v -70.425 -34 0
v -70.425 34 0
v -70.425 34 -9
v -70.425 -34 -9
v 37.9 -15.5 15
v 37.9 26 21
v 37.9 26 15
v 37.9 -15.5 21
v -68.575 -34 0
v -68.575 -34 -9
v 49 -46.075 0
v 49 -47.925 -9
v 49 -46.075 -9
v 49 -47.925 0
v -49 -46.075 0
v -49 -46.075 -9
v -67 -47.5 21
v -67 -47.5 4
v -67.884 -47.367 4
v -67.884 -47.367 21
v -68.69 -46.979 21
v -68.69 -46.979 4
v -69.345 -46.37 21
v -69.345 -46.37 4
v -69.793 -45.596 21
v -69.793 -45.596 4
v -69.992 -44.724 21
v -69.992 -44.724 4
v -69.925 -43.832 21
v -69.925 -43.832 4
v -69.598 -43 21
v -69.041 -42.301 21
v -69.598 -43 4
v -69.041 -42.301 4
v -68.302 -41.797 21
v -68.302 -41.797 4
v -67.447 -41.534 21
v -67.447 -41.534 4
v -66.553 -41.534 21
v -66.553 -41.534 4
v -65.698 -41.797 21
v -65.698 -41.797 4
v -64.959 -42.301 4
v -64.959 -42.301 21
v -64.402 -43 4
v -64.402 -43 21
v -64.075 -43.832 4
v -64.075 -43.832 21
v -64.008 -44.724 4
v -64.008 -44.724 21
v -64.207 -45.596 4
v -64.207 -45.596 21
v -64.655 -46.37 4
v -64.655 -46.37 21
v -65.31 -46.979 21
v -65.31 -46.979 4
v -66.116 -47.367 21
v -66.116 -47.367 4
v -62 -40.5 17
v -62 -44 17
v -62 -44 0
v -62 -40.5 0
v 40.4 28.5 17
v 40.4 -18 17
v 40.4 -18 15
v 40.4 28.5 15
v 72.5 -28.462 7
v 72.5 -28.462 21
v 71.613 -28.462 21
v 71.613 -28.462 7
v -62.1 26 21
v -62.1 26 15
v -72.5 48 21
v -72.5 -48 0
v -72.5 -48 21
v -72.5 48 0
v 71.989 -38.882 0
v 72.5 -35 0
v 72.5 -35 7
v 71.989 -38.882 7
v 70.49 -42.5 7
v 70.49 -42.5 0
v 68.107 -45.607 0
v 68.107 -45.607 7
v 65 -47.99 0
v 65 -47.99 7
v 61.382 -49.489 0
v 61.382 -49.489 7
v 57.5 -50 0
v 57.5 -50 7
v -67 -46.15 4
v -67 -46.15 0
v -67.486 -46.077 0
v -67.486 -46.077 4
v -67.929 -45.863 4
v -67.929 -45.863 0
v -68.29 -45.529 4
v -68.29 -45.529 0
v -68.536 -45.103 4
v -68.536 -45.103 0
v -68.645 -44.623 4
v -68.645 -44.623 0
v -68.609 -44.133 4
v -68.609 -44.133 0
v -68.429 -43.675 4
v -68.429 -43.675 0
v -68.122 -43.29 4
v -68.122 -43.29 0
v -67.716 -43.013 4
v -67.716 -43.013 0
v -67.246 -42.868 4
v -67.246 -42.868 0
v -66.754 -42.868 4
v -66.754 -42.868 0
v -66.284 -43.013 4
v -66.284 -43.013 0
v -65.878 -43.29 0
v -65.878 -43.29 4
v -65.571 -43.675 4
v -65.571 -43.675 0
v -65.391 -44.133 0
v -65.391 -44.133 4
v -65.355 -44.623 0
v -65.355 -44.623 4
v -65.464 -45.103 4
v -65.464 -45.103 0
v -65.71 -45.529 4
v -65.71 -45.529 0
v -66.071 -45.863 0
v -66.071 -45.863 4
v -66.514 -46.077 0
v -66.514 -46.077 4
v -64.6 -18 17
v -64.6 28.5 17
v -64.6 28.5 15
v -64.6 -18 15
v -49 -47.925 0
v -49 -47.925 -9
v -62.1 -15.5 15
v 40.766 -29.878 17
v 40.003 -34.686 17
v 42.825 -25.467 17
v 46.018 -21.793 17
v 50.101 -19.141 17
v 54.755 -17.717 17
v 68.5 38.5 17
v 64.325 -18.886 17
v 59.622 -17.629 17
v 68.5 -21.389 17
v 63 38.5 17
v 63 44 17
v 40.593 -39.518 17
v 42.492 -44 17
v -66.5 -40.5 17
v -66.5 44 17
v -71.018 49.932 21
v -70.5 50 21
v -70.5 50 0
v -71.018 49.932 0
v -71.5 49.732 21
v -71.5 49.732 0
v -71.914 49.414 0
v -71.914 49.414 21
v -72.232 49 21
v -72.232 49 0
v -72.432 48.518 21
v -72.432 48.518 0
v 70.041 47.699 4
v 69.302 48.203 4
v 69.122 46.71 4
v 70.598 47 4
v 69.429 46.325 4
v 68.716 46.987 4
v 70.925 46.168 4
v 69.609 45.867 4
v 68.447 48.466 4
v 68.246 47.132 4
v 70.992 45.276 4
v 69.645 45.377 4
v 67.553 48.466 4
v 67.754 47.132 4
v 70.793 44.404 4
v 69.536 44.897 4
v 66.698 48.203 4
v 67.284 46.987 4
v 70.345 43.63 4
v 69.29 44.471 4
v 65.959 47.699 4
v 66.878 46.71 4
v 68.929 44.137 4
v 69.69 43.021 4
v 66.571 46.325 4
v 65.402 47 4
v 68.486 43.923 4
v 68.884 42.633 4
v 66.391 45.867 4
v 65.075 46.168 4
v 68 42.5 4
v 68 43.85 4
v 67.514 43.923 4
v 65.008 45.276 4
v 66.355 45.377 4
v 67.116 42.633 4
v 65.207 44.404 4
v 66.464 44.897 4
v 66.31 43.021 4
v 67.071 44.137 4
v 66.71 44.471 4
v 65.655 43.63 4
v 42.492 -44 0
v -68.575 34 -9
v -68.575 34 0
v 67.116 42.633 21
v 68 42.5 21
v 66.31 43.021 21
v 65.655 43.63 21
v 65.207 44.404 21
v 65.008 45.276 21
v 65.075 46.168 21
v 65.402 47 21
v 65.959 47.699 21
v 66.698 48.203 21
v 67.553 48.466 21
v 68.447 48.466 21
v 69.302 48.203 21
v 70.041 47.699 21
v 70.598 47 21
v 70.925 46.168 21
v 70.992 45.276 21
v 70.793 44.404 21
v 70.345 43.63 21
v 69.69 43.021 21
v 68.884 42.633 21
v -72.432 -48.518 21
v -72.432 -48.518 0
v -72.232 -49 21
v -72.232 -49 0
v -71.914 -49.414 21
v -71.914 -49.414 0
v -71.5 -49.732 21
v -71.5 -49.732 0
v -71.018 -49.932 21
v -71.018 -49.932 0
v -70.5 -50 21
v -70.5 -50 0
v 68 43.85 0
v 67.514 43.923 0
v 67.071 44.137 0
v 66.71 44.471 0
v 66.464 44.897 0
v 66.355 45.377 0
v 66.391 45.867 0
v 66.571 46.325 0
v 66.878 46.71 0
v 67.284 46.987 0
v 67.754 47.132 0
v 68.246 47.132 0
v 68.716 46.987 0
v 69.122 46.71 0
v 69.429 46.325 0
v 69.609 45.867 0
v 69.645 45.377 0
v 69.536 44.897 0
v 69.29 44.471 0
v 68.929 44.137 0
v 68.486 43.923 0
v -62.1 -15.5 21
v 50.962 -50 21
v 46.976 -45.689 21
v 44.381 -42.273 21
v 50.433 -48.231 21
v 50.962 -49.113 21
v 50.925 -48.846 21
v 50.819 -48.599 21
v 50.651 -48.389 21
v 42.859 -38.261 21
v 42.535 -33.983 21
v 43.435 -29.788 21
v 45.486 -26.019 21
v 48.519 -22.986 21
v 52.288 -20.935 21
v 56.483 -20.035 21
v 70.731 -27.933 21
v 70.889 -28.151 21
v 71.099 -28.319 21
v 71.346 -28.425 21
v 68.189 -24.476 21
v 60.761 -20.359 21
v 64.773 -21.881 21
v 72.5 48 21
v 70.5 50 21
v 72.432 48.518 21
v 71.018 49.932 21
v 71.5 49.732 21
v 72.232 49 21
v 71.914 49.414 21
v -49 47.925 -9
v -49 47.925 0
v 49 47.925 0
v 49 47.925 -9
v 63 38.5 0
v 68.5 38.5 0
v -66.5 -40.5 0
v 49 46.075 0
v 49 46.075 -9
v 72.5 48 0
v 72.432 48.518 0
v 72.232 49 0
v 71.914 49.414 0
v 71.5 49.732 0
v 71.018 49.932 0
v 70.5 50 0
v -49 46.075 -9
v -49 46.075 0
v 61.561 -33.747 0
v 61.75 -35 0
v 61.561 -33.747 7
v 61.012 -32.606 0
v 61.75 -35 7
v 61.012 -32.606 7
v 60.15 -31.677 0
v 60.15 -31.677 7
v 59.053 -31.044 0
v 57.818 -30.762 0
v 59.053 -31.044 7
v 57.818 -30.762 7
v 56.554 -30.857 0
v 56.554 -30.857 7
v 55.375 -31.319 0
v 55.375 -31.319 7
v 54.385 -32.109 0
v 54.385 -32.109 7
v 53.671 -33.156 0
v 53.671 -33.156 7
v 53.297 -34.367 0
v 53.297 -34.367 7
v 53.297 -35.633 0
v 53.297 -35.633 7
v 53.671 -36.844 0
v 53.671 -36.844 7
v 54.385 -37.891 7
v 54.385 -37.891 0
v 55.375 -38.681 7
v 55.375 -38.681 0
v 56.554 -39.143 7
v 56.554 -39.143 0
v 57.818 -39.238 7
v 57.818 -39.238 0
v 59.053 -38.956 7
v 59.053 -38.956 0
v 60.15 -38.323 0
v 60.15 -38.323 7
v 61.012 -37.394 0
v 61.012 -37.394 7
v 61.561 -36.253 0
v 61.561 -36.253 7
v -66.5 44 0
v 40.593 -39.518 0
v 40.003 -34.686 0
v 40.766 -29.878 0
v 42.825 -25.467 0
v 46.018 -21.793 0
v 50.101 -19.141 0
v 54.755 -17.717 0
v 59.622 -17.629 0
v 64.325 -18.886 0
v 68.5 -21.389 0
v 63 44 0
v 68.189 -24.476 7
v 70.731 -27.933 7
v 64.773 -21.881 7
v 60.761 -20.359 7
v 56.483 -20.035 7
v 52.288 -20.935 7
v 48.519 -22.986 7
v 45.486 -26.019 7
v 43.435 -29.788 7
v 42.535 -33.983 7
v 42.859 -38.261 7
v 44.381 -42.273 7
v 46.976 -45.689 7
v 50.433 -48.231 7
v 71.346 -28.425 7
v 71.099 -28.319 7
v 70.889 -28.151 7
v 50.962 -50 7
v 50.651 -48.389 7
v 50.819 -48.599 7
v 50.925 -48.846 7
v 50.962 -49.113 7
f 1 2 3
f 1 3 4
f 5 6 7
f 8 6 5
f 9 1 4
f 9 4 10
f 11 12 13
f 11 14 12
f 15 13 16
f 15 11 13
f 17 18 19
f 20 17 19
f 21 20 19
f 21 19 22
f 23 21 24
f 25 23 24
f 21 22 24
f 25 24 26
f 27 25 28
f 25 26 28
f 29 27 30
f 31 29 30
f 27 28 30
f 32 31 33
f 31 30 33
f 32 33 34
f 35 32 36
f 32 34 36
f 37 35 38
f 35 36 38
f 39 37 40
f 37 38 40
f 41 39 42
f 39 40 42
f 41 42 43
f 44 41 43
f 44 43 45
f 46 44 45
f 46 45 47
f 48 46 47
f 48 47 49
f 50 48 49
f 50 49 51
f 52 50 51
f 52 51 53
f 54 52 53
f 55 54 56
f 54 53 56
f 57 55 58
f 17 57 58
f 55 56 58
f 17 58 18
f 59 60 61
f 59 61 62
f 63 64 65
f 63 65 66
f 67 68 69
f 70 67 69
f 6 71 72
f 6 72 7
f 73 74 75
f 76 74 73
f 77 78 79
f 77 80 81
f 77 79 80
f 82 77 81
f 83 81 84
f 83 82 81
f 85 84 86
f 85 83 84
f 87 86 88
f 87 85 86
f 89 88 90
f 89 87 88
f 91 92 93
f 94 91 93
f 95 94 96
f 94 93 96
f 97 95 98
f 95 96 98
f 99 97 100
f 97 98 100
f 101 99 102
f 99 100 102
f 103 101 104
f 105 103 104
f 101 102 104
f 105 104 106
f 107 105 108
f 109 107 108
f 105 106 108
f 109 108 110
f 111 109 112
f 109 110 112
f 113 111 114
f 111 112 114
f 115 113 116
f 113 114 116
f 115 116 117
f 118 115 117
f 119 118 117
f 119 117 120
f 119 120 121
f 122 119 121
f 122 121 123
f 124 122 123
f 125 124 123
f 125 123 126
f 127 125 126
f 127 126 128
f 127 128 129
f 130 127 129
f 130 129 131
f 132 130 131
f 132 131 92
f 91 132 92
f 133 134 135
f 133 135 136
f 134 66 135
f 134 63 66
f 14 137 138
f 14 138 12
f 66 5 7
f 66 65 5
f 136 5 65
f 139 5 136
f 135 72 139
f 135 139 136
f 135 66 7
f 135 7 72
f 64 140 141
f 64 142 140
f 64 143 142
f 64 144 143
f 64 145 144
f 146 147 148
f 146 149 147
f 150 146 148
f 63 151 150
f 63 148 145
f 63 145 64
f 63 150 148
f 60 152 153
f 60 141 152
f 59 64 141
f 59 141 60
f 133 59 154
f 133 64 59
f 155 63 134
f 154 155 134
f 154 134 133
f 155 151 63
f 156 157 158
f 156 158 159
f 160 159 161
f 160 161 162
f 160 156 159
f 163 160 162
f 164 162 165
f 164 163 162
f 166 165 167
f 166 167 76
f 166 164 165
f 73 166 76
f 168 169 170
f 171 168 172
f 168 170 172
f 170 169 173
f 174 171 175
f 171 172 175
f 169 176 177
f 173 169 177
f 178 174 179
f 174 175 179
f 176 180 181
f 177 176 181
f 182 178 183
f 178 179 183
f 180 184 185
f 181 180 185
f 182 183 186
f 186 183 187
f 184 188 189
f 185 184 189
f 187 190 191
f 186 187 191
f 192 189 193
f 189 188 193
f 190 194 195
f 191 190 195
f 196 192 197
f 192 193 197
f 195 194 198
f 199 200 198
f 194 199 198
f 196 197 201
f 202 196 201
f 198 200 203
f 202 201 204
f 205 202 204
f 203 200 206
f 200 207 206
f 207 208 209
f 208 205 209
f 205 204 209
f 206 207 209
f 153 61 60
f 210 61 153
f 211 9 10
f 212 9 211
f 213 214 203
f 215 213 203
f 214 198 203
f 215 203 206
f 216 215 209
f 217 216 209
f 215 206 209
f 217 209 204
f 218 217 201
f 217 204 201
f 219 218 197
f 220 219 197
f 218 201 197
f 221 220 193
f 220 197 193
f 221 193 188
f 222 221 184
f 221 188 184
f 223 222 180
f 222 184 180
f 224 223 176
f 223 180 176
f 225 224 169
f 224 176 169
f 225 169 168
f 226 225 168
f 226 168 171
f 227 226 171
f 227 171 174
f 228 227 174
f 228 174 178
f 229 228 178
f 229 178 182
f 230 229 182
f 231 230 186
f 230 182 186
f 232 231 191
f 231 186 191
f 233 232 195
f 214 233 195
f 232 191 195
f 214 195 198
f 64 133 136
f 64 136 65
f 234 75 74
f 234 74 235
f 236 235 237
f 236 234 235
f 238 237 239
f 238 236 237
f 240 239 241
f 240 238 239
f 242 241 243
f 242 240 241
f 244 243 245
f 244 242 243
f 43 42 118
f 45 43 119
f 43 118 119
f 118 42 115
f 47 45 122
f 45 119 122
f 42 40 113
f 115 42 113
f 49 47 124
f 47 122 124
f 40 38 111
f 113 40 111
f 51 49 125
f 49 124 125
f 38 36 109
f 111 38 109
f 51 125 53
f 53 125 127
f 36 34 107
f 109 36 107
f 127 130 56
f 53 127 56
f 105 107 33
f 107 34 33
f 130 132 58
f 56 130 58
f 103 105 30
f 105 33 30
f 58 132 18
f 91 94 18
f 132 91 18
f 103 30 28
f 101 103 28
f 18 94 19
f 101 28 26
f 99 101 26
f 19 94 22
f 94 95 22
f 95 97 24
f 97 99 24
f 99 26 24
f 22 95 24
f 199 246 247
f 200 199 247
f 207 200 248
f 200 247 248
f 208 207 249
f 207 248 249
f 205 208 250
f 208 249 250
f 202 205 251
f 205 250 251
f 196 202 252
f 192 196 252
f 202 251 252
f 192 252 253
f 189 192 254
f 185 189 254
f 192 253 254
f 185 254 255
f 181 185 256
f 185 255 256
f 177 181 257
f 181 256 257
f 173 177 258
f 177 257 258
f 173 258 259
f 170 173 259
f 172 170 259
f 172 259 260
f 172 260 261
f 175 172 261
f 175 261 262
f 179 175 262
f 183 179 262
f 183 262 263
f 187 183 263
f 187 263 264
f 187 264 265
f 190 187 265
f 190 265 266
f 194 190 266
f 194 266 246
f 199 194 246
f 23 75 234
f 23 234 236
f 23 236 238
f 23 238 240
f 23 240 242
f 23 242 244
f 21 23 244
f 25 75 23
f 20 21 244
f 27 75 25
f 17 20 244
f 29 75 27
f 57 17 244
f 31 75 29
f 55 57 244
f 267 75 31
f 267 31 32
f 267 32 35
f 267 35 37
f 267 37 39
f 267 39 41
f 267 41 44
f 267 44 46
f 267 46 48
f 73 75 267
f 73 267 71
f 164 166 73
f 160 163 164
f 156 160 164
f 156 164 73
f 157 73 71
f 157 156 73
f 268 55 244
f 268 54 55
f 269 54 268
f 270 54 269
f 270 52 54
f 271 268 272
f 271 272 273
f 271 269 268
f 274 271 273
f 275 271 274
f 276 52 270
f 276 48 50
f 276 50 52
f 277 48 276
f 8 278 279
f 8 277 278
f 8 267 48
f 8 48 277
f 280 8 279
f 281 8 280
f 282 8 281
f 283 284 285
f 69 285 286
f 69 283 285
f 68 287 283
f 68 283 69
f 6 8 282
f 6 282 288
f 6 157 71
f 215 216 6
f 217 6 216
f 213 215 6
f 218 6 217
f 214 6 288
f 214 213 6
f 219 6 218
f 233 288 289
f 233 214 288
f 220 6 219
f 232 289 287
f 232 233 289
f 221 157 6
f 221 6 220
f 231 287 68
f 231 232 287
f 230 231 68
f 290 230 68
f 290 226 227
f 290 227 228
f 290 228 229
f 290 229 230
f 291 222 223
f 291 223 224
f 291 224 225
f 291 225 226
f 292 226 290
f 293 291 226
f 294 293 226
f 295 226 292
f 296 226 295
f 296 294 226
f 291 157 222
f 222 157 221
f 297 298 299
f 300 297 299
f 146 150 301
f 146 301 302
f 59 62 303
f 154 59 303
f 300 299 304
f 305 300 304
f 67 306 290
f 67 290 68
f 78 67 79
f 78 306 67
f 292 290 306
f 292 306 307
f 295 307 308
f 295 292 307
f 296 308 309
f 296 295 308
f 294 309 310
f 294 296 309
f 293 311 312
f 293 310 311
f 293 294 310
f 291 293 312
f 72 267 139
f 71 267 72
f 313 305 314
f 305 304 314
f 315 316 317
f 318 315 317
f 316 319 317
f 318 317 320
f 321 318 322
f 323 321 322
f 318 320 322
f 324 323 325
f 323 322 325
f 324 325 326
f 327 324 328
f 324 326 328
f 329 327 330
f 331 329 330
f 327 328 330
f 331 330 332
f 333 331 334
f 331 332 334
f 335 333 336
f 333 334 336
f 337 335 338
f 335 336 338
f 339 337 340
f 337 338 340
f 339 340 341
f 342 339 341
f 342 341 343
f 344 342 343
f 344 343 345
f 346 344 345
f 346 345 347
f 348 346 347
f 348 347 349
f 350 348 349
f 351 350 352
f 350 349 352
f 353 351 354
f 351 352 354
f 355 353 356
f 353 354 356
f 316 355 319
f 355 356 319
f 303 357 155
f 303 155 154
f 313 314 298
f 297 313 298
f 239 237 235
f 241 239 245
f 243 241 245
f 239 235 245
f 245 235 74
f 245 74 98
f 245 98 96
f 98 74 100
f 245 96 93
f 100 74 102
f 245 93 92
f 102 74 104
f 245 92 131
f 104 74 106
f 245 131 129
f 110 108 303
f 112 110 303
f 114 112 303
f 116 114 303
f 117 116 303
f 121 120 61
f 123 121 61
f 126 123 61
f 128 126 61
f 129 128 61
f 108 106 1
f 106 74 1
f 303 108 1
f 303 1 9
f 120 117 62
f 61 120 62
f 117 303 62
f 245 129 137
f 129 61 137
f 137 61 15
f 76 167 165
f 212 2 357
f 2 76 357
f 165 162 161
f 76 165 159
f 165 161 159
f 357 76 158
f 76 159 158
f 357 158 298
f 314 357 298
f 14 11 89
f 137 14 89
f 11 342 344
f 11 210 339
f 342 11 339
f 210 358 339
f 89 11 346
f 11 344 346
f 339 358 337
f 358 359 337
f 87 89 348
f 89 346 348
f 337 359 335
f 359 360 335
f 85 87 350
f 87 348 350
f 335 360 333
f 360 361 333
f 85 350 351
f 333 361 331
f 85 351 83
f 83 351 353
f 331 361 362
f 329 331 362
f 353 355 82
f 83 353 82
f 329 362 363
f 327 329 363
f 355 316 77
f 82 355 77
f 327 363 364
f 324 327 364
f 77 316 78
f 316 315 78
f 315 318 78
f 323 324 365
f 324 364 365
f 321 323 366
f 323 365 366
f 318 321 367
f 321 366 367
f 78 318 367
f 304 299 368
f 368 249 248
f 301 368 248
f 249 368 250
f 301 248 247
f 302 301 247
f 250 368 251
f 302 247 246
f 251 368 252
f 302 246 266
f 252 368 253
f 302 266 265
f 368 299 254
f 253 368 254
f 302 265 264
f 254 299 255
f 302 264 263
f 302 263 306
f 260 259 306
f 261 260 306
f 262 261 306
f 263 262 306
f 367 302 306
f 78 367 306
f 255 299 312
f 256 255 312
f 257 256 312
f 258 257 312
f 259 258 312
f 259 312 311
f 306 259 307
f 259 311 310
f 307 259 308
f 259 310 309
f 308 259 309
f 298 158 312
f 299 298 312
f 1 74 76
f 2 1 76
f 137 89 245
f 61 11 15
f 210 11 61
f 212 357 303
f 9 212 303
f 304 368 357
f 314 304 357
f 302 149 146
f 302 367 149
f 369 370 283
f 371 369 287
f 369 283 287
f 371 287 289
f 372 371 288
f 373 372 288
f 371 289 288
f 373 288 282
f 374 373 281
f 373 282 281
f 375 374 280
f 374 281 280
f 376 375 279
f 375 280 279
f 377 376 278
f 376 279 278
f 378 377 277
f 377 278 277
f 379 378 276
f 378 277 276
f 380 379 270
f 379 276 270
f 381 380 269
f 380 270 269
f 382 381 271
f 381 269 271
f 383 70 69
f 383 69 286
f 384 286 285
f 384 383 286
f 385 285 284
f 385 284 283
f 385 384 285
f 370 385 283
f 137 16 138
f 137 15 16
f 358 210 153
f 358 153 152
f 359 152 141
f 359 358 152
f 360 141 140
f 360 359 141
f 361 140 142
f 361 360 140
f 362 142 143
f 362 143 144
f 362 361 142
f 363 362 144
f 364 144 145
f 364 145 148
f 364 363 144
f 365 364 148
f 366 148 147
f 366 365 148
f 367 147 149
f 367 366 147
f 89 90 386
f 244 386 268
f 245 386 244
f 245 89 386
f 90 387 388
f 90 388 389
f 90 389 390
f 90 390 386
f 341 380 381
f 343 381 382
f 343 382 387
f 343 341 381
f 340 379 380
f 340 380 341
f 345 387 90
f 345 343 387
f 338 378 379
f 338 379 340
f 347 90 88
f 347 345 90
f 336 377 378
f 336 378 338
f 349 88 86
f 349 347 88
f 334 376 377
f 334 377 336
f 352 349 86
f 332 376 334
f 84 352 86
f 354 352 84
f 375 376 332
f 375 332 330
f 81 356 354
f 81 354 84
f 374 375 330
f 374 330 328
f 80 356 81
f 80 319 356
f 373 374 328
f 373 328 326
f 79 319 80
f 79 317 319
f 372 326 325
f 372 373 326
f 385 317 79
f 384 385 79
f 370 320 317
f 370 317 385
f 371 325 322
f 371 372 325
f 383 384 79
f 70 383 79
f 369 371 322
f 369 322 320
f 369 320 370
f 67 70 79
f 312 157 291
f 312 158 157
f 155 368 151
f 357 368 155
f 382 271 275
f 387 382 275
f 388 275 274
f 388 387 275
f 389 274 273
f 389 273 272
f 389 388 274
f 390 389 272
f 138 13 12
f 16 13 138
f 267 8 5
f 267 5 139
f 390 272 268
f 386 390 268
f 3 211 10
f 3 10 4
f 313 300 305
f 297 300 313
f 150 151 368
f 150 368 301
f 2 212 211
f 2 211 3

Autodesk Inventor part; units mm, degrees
ref_plane "YZ Plane" through (0, 0, 0) normal (1, 0, 0) x (0, 1, 0)
ref_plane "XZ Plane" through (0, 0, 0) normal (0, 1, 0) x (-1, 0, 0)
ref_plane "XY Plane" through (0, 0, 0) normal (0, 0, 1) x (1, 0, 0)
sketch "Náčrt1" plane through (0, 0, 0) normal (0, 0, 1) x (1, 0, 0)
  line L0 (0, 71.1184) -> (0, -73.8108) projected
  line L1 (-102.6184, 0) -> (105.3108, 0) projected
  line L2 (-72.5, 50) -> (72.5, 50)
  line L3 (72.5, 50) -> (72.5, -35)
  line L4 (57.5, -50) -> (-72.5, -50)
  line L5 (-72.5, -50) -> (-72.5, 50)
  arc A0 (57.5, -50) -> (72.5, -35) centre (57.5, -35) ccw
  point P0 (0, 0)
  dimension "d2" = 30
  dimension "d37" = 145
  dimension "d38" = 100
extrude "Vysunutí1" add sketch "Náčrt1" along normal blind 21
sketch "Náčrt2" plane through (0, 0, 21) normal (0, 0, 1) x (1, 0, 0)
  line L0 (-72.5, -50) -> (57.5, -50) projected
  arc A0 (57.5, -50) -> (72.5, -35) centre (57.5, -35) ccw projected
  line L1 (72.5, -35) -> (72.5, 50) projected
  line L2 (72.5, 50) -> (-72.5, 50) projected
  line L3 (-72.5, 50) -> (-72.5, -50) projected
  circle A1 centre (57.5, -35) radius 15
  line L4 (72.5, -27.3264) -> (72.5, -35)
  line L5 (64.2851, -50) -> (57.5, -50)
  line L6 (72.5, -35) -> (72.5, 50) projected
  line L7 (72.5, -35) -> (72.5, -35)
  line L8 (72.5, -28.4617) -> (71, -28.4617)
  line L9 (50.9617, -48.5) -> (50.9617, -50)
  point P0 (0, 0)
  point P1 (49.2851, -47.5505)
  point P2 (70.3886, -27.3264)
  point P3 (50.9617, -50)
  dimension "d11" = 1.5
  dimension "d12" = 1.5
extrude "Vysunutí2" cut sketch "Náčrt2" against normal blind 14 contours L9 A1 L0 | A1 A0 | A1 L8 L1
sketch "Náčrt3" plane through (0, 0, 7) normal (0, 0, 1) x (1, 0, 0)
  arc A0 (57.5, -50) -> (72.5, -35) centre (57.5, -35) ccw projected
  circle A1 centre (57.5, -35) radius 4.25
  line L0 (72.5, -28.4617) -> (72.5, -35) projected
  line L1 (57.5, -50) -> (50.9617, -50) projected
  line L2 (71, -28.4617) -> (72.5, -28.4617) projected
  arc A2 (71, -28.4617) -> (50.9617, -48.5) centre (57.5, -35) ccw projected
  line L3 (50.9617, -50) -> (50.9617, -48.5) projected
  point P0 (0, 0)
  dimension "d7" = 8.5
extrude "Vysunutí3" cut sketch "Náčrt3" against normal blind 12 contours A1
fillet "Zaoblení1" radius 2 3 edges at (72.5, 50, 10.5) (-72.5, 50, 10.5) (-72.5, -50, 10.5)
fillet "Zaoblení2" radius 1 2 edges at (71, -28.4617, 14) (50.9617, -48.5, 14)
sketch "Náčrt4" plane through (0, 0, 21) normal (0, 0, 1) x (1, 0, 0)
  arc A0 (50.9617, -49.1129) -> (50.4328, -48.2308) centre (49.9617, -49.1129) ccw projected
  arc A1 (70.7308, -27.9328) -> (50.4328, -48.2308) centre (57.5, -35) ccw projected
  arc A2 (70.7308, -27.9328) -> (71.6129, -28.4617) centre (71.6129, -27.4617) ccw projected
  line L0 (71.6129, -28.4617) -> (72.5, -28.4617) projected
  line L1 (72.5, -28.4617) -> (72.5, 48) projected
  arc A3 (72.5, 48) -> (70.5, 50) centre (70.5, 48) ccw projected
  line L2 (70.5, 50) -> (-70.5, 50) projected
  arc A4 (-70.5, 50) -> (-72.5, 48) centre (-70.5, 48) ccw projected
  line L3 (-72.5, 48) -> (-72.5, -48) projected
  arc A5 (-72.5, -48) -> (-70.5, -50) centre (-70.5, -48) ccw projected
  line L4 (-70.5, -50) -> (50.9617, -50) projected
  line L5 (50.9617, -50) -> (50.9617, -49.1129) projected
  line L6 (-66.5, 44) -> (68.5, 44) construction
  line L7 (68.5, 44) -> (68.5, -44) construction
  line L8 (68.5, -44) -> (-66.5, -44) construction
  line L9 (-66.5, -44) -> (-66.5, 44) construction
  point P0 (0, 0)
  dimension "d14" = 4
  dimension "d15" = 6
  dimension "d16" = 6
  dimension "d17" = 6
sketch "Náčrt5" plane through (0, 0, 21) normal (0, 0, 1) x (1, 0, 0)
  line L0 (-62.1, 26) -> (37.9, 26)
  line L1 (37.9, 26) -> (37.9, -15.5)
  line L2 (37.9, -15.5) -> (-62.1, -15.5)
  line L3 (-62.1, -15.5) -> (-62.1, 26)
  line L4 (-66.5, 44) -> (68.5, 44) construction
  line L5 (-66.5, -44) -> (-66.5, 44) construction
  line L6 (68.5, -44) -> (-66.5, -44) construction
  line L7 (68.5, 44) -> (68.5, -44) construction
  point P0 (0, 0)
  dimension "d18" = 100
  dimension "d19" = 41.5
  dimension "d20" = 18
  dimension "d21" = 4.4
extrude "Vysunutí4" cut sketch "Náčrt5" against normal blind 21
sketch "Náčrt6" plane through (0, 0, 0) normal (0, 0, -1) x (-1, 0, 0)
  line L0 (-37.9, -15.5) -> (-37.9, 26) projected
  line L1 (-37.9, 26) -> (62.1, 26) projected
  line L2 (62.1, 26) -> (62.1, -15.5) projected
  line L3 (62.1, -15.5) -> (-37.9, -15.5) projected
  arc A0 (70.5, -50) -> (72.5, -48) centre (70.5, -48) ccw projected
  line L4 (72.5, 48) -> (72.5, -48) projected
  arc A1 (72.5, 48) -> (70.5, 50) centre (70.5, 48) ccw projected
  line L5 (-70.5, 50) -> (70.5, 50) projected
  arc A2 (-70.5, 50) -> (-72.5, 48) centre (-70.5, 48) ccw projected
  line L6 (-72.5, -35) -> (-72.5, 48) projected
  arc A3 (-72.5, -35) -> (-57.5, -50) centre (-57.5, -35) ccw projected
  line L7 (70.5, -50) -> (-57.5, -50) projected
  circle A4 centre (-57.5, -35) radius 4.25 projected
  arc A5 (-50.4328, -48.2308) -> (-70.7308, -27.9328) centre (-57.5, -35) ccw projected
  line L8 (0, -73.8108) -> (0, 71.1184) projected
  line L9 (-105.3108, 0) -> (102.6184, 0) projected
  line L10 (-68.5, 44) -> (66.5, 44)
  line L11 (66.5, 44) -> (66.5, -44)
  line L12 (66.5, -44) -> (-42.4917, -44)
  line L13 (-68.5, -24.802) -> (-68.5, 44)
  arc A6 (-42.4917, -44) -> (-68.5, -21.3893) centre (-57.5, -35) ccw
  point P0 (0, 0)
  dimension "d24" = 4
  dimension "d25" = 6
  dimension "d26" = 6
  dimension "d27" = 6
  dimension "d28" = 35
extrude "Vysunutí5" cut sketch "Náčrt6" against normal blind 17 contours L3 L8 L12 A6 L13 L9 L0 | L9 L13 L10 L8 L1 L0 | L3 L2 L9 L11 L12 L8 | L8 L10 L11 L9 L2 L1
sketch "Náčrt7" plane through (0, 0, 17) normal (0, 0, -1) x (-1, 0, 0)
  line L0 (-68.5, 44) -> (66.5, 44) projected
  line L1 (-68.5, -21.3893) -> (-68.5, 44) projected
  arc A0 (-42.4917, -44) -> (-68.5, -21.3893) centre (-57.5, -35) ccw projected
  line L2 (66.5, -44) -> (-42.4917, -44) projected
  line L3 (66.5, 44) -> (66.5, -44) projected
  line L4 (62.1, -15.5) -> (62.1, 26) projected
  line L5 (-37.9, -15.5) -> (62.1, -15.5) projected
  line L6 (-37.9, 26) -> (-37.9, -15.5) projected
  line L7 (62.1, 26) -> (-37.9, 26) projected
  line L8 (-40.4, 28.5) -> (64.6, 28.5)
  line L9 (64.6, 28.5) -> (64.6, -18)
  line L10 (64.6, -18) -> (-40.4, -18)
  line L11 (-40.4, -18) -> (-40.4, 28.5)
  point P0 (0, 0)
  dimension "d31" = 2.5
  dimension "d32" = 2.5
  dimension "d33" = 2.5
  dimension "d34" = 2.5
extrude "Vysunutí6" add sketch "Náčrt7" along normal blind 2 contours L8 L9 L10 L11
sketch "Náčrt8" plane through (0, 0, 0) normal (0, 0, -1) x (-1, 0, 0)
  line L0 (-68.5, -21.3893) -> (-68.5, 44) projected
  line L1 (-68.5, 44) -> (66.5, 44) projected
  line L2 (66.5, 44) -> (66.5, -44) projected
  line L3 (66.5, -44) -> (-42.4917, -44) projected
  arc A0 (-42.4917, -44) -> (-68.5, -21.3893) centre (-57.5, -35) ccw projected
  arc A1 (70.5, -50) -> (72.5, -48) centre (70.5, -48) ccw projected
  line L4 (72.5, 48) -> (72.5, -48) projected
  arc A2 (72.5, 48) -> (70.5, 50) centre (70.5, 48) ccw projected
  line L5 (-70.5, 50) -> (70.5, 50) projected
  arc A3 (-70.5, 50) -> (-72.5, 48) centre (-70.5, 48) ccw projected
  line L6 (-72.5, -35) -> (-72.5, 48) projected
  arc A4 (-72.5, -35) -> (-57.5, -50) centre (-57.5, -35) ccw projected
  line L7 (70.5, -50) -> (-57.5, -50) projected
  circle A5 centre (-57.5, -35) radius 4.25 projected
  point P0 (0, 0)
sketch "Náčrt9" plane through (0, 0, 17) normal (0, 0, -1) x (-1, 0, 0)
  line L0 (-40.4, -18) -> (-40.4, 28.5) projected
  line L1 (-40.4, 28.5) -> (64.6, 28.5) projected
  line L2 (64.6, 28.5) -> (64.6, -18) projected
  line L3 (64.6, -18) -> (-40.4, -18) projected
  line L4 (-68.5, 44) -> (66.5, 44) projected
  line L5 (-68.5, -21.3893) -> (-68.5, 44) projected
  arc A0 (-42.4917, -44) -> (-68.5, -21.3893) centre (-57.5, -35) ccw projected
  line L6 (66.5, -44) -> (-42.4917, -44) projected
  line L7 (66.5, 44) -> (66.5, -44) projected
  line L8 (66.5, -44) -> (-42.4917, -44) projected
  line L9 (66.5, -44) -> (62, -44)
  line L10 (62, -44) -> (62, -40.5)
  line L11 (62, -40.5) -> (66.5, -40.5)
  line L12 (66.5, -40.5) -> (66.5, -44)
  line L13 (-68.5, 44) -> (-63, 44)
  line L14 (-63, 44) -> (-63, 38.5)
  line L15 (-63, 38.5) -> (-68.5, 38.5)
  line L16 (-68.5, 38.5) -> (-68.5, 44)
  point P0 (0, 0)
  dimension "d48" = 4.5
  dimension "d49" = 3.5
  dimension "d50" = 5.5
  dimension "d51" = 5.5
extrude "Vysunutí7" add sketch "Náčrt9" along normal up to surface (17 mm away) contours L4 L14 L15 L5 | L7 L6 L10 L11
sketch "Náčrt10" plane through (0, 0, 0) normal (0, 0, -1) x (-1, 0, 0)
  circle A0 centre (67, -44.5) radius 3
  circle A1 centre (-68, 45.5) radius 3
  line L0 (-72.5, -35) -> (-72.5, 48) projected
  line L1 (-70.5, 50) -> (70.5, 50) projected
  line L2 (70.5, -50) -> (-57.5, -50) projected
  line L3 (72.5, 48) -> (72.5, -48) projected
  point P0 (0, 0)
  dimension "d54" = 6
  dimension "d55" = 6
  dimension "d56" = 4.5
  dimension "d57" = 4.5
  dimension "d58" = 5.5
  dimension "d59" = 5.5
sketch "Náčrt11" plane through (0, 0, 21) normal (0, 0, 1) x (1, 0, 0)
  point P0 (0, 0)
  point P1 (-67, -44.5)
  point P2 (68, 45.5)
  point P3 (68, 45.5)
  point P4 (-67, -44.5)
hole "Díra1" at (68, 45.5, 21) at (-67, -44.5, 21) direction (0, 0, -1) diameter 6 depth 17
sketch "Náčrt12" plane through (68, 45.5, 4) normal (0, 0, 1) x (1, 0, 0)
  line L0 (4.5, -73.9617) -> (4.5, 2.5) projected
  line L1 (2.5, 4.5) -> (-138.5, 4.5) projected
  circle A0 centre (-135, -90) radius 3 projected
  point P0 (-68, -45.5)
  point P1 (0, 0)
  dimension "d67" = 4.5
  dimension "d68" = 4.5
hole "Díra2" at (68, 45.5, 4) at (-67, -44.5, 4) direction (0, 0, -1) diameter 3.3 depth 17
sketch "Náčrt13" plane through (0, 0, 0) normal (0, 0, -1) x (-1, 0, 0)
  line L0 (49, -47.925) -> (-49, -47.925)
  line L1 (-49, -47.925) -> (-49, -46.075)
  line L2 (-49, -46.075) -> (49, -46.075)
  line L3 (49, -46.075) -> (49, -47.925)
  line L4 (0, -73.8108) -> (0, 71.1184) projected
  line L5 (70.5, -50) -> (-57.5, -50) projected
  line L6 (-105.3108, 0) -> (102.6184, 0) projected
  line L7 (49, 47.925) -> (-49, 47.925)
  line L8 (-49, 47.925) -> (-49, 46.075)
  line L9 (-49, 46.075) -> (49, 46.075)
  line L10 (49, 46.075) -> (49, 47.925)
  line L11 (70.425, -34) -> (68.575, -34)
  line L12 (68.575, -34) -> (68.575, 34)
  line L13 (68.575, 34) -> (70.425, 34)
  line L14 (70.425, 34) -> (70.425, -34)
  line L15 (66.5, 44) -> (66.5, -40.5) projected
  point P0 (0, 0)
  dimension "d76" = 98
  dimension "d77" = 1.85
  dimension "d78" = 2.075
  dimension "d79" = 1.85
  dimension "d80" = 68
  dimension "d81" = 2.075
extrude "Vysunutí8" add sketch "Náčrt13" along normal blind 9
properties part number "Krabička_horni_3D tisk"
